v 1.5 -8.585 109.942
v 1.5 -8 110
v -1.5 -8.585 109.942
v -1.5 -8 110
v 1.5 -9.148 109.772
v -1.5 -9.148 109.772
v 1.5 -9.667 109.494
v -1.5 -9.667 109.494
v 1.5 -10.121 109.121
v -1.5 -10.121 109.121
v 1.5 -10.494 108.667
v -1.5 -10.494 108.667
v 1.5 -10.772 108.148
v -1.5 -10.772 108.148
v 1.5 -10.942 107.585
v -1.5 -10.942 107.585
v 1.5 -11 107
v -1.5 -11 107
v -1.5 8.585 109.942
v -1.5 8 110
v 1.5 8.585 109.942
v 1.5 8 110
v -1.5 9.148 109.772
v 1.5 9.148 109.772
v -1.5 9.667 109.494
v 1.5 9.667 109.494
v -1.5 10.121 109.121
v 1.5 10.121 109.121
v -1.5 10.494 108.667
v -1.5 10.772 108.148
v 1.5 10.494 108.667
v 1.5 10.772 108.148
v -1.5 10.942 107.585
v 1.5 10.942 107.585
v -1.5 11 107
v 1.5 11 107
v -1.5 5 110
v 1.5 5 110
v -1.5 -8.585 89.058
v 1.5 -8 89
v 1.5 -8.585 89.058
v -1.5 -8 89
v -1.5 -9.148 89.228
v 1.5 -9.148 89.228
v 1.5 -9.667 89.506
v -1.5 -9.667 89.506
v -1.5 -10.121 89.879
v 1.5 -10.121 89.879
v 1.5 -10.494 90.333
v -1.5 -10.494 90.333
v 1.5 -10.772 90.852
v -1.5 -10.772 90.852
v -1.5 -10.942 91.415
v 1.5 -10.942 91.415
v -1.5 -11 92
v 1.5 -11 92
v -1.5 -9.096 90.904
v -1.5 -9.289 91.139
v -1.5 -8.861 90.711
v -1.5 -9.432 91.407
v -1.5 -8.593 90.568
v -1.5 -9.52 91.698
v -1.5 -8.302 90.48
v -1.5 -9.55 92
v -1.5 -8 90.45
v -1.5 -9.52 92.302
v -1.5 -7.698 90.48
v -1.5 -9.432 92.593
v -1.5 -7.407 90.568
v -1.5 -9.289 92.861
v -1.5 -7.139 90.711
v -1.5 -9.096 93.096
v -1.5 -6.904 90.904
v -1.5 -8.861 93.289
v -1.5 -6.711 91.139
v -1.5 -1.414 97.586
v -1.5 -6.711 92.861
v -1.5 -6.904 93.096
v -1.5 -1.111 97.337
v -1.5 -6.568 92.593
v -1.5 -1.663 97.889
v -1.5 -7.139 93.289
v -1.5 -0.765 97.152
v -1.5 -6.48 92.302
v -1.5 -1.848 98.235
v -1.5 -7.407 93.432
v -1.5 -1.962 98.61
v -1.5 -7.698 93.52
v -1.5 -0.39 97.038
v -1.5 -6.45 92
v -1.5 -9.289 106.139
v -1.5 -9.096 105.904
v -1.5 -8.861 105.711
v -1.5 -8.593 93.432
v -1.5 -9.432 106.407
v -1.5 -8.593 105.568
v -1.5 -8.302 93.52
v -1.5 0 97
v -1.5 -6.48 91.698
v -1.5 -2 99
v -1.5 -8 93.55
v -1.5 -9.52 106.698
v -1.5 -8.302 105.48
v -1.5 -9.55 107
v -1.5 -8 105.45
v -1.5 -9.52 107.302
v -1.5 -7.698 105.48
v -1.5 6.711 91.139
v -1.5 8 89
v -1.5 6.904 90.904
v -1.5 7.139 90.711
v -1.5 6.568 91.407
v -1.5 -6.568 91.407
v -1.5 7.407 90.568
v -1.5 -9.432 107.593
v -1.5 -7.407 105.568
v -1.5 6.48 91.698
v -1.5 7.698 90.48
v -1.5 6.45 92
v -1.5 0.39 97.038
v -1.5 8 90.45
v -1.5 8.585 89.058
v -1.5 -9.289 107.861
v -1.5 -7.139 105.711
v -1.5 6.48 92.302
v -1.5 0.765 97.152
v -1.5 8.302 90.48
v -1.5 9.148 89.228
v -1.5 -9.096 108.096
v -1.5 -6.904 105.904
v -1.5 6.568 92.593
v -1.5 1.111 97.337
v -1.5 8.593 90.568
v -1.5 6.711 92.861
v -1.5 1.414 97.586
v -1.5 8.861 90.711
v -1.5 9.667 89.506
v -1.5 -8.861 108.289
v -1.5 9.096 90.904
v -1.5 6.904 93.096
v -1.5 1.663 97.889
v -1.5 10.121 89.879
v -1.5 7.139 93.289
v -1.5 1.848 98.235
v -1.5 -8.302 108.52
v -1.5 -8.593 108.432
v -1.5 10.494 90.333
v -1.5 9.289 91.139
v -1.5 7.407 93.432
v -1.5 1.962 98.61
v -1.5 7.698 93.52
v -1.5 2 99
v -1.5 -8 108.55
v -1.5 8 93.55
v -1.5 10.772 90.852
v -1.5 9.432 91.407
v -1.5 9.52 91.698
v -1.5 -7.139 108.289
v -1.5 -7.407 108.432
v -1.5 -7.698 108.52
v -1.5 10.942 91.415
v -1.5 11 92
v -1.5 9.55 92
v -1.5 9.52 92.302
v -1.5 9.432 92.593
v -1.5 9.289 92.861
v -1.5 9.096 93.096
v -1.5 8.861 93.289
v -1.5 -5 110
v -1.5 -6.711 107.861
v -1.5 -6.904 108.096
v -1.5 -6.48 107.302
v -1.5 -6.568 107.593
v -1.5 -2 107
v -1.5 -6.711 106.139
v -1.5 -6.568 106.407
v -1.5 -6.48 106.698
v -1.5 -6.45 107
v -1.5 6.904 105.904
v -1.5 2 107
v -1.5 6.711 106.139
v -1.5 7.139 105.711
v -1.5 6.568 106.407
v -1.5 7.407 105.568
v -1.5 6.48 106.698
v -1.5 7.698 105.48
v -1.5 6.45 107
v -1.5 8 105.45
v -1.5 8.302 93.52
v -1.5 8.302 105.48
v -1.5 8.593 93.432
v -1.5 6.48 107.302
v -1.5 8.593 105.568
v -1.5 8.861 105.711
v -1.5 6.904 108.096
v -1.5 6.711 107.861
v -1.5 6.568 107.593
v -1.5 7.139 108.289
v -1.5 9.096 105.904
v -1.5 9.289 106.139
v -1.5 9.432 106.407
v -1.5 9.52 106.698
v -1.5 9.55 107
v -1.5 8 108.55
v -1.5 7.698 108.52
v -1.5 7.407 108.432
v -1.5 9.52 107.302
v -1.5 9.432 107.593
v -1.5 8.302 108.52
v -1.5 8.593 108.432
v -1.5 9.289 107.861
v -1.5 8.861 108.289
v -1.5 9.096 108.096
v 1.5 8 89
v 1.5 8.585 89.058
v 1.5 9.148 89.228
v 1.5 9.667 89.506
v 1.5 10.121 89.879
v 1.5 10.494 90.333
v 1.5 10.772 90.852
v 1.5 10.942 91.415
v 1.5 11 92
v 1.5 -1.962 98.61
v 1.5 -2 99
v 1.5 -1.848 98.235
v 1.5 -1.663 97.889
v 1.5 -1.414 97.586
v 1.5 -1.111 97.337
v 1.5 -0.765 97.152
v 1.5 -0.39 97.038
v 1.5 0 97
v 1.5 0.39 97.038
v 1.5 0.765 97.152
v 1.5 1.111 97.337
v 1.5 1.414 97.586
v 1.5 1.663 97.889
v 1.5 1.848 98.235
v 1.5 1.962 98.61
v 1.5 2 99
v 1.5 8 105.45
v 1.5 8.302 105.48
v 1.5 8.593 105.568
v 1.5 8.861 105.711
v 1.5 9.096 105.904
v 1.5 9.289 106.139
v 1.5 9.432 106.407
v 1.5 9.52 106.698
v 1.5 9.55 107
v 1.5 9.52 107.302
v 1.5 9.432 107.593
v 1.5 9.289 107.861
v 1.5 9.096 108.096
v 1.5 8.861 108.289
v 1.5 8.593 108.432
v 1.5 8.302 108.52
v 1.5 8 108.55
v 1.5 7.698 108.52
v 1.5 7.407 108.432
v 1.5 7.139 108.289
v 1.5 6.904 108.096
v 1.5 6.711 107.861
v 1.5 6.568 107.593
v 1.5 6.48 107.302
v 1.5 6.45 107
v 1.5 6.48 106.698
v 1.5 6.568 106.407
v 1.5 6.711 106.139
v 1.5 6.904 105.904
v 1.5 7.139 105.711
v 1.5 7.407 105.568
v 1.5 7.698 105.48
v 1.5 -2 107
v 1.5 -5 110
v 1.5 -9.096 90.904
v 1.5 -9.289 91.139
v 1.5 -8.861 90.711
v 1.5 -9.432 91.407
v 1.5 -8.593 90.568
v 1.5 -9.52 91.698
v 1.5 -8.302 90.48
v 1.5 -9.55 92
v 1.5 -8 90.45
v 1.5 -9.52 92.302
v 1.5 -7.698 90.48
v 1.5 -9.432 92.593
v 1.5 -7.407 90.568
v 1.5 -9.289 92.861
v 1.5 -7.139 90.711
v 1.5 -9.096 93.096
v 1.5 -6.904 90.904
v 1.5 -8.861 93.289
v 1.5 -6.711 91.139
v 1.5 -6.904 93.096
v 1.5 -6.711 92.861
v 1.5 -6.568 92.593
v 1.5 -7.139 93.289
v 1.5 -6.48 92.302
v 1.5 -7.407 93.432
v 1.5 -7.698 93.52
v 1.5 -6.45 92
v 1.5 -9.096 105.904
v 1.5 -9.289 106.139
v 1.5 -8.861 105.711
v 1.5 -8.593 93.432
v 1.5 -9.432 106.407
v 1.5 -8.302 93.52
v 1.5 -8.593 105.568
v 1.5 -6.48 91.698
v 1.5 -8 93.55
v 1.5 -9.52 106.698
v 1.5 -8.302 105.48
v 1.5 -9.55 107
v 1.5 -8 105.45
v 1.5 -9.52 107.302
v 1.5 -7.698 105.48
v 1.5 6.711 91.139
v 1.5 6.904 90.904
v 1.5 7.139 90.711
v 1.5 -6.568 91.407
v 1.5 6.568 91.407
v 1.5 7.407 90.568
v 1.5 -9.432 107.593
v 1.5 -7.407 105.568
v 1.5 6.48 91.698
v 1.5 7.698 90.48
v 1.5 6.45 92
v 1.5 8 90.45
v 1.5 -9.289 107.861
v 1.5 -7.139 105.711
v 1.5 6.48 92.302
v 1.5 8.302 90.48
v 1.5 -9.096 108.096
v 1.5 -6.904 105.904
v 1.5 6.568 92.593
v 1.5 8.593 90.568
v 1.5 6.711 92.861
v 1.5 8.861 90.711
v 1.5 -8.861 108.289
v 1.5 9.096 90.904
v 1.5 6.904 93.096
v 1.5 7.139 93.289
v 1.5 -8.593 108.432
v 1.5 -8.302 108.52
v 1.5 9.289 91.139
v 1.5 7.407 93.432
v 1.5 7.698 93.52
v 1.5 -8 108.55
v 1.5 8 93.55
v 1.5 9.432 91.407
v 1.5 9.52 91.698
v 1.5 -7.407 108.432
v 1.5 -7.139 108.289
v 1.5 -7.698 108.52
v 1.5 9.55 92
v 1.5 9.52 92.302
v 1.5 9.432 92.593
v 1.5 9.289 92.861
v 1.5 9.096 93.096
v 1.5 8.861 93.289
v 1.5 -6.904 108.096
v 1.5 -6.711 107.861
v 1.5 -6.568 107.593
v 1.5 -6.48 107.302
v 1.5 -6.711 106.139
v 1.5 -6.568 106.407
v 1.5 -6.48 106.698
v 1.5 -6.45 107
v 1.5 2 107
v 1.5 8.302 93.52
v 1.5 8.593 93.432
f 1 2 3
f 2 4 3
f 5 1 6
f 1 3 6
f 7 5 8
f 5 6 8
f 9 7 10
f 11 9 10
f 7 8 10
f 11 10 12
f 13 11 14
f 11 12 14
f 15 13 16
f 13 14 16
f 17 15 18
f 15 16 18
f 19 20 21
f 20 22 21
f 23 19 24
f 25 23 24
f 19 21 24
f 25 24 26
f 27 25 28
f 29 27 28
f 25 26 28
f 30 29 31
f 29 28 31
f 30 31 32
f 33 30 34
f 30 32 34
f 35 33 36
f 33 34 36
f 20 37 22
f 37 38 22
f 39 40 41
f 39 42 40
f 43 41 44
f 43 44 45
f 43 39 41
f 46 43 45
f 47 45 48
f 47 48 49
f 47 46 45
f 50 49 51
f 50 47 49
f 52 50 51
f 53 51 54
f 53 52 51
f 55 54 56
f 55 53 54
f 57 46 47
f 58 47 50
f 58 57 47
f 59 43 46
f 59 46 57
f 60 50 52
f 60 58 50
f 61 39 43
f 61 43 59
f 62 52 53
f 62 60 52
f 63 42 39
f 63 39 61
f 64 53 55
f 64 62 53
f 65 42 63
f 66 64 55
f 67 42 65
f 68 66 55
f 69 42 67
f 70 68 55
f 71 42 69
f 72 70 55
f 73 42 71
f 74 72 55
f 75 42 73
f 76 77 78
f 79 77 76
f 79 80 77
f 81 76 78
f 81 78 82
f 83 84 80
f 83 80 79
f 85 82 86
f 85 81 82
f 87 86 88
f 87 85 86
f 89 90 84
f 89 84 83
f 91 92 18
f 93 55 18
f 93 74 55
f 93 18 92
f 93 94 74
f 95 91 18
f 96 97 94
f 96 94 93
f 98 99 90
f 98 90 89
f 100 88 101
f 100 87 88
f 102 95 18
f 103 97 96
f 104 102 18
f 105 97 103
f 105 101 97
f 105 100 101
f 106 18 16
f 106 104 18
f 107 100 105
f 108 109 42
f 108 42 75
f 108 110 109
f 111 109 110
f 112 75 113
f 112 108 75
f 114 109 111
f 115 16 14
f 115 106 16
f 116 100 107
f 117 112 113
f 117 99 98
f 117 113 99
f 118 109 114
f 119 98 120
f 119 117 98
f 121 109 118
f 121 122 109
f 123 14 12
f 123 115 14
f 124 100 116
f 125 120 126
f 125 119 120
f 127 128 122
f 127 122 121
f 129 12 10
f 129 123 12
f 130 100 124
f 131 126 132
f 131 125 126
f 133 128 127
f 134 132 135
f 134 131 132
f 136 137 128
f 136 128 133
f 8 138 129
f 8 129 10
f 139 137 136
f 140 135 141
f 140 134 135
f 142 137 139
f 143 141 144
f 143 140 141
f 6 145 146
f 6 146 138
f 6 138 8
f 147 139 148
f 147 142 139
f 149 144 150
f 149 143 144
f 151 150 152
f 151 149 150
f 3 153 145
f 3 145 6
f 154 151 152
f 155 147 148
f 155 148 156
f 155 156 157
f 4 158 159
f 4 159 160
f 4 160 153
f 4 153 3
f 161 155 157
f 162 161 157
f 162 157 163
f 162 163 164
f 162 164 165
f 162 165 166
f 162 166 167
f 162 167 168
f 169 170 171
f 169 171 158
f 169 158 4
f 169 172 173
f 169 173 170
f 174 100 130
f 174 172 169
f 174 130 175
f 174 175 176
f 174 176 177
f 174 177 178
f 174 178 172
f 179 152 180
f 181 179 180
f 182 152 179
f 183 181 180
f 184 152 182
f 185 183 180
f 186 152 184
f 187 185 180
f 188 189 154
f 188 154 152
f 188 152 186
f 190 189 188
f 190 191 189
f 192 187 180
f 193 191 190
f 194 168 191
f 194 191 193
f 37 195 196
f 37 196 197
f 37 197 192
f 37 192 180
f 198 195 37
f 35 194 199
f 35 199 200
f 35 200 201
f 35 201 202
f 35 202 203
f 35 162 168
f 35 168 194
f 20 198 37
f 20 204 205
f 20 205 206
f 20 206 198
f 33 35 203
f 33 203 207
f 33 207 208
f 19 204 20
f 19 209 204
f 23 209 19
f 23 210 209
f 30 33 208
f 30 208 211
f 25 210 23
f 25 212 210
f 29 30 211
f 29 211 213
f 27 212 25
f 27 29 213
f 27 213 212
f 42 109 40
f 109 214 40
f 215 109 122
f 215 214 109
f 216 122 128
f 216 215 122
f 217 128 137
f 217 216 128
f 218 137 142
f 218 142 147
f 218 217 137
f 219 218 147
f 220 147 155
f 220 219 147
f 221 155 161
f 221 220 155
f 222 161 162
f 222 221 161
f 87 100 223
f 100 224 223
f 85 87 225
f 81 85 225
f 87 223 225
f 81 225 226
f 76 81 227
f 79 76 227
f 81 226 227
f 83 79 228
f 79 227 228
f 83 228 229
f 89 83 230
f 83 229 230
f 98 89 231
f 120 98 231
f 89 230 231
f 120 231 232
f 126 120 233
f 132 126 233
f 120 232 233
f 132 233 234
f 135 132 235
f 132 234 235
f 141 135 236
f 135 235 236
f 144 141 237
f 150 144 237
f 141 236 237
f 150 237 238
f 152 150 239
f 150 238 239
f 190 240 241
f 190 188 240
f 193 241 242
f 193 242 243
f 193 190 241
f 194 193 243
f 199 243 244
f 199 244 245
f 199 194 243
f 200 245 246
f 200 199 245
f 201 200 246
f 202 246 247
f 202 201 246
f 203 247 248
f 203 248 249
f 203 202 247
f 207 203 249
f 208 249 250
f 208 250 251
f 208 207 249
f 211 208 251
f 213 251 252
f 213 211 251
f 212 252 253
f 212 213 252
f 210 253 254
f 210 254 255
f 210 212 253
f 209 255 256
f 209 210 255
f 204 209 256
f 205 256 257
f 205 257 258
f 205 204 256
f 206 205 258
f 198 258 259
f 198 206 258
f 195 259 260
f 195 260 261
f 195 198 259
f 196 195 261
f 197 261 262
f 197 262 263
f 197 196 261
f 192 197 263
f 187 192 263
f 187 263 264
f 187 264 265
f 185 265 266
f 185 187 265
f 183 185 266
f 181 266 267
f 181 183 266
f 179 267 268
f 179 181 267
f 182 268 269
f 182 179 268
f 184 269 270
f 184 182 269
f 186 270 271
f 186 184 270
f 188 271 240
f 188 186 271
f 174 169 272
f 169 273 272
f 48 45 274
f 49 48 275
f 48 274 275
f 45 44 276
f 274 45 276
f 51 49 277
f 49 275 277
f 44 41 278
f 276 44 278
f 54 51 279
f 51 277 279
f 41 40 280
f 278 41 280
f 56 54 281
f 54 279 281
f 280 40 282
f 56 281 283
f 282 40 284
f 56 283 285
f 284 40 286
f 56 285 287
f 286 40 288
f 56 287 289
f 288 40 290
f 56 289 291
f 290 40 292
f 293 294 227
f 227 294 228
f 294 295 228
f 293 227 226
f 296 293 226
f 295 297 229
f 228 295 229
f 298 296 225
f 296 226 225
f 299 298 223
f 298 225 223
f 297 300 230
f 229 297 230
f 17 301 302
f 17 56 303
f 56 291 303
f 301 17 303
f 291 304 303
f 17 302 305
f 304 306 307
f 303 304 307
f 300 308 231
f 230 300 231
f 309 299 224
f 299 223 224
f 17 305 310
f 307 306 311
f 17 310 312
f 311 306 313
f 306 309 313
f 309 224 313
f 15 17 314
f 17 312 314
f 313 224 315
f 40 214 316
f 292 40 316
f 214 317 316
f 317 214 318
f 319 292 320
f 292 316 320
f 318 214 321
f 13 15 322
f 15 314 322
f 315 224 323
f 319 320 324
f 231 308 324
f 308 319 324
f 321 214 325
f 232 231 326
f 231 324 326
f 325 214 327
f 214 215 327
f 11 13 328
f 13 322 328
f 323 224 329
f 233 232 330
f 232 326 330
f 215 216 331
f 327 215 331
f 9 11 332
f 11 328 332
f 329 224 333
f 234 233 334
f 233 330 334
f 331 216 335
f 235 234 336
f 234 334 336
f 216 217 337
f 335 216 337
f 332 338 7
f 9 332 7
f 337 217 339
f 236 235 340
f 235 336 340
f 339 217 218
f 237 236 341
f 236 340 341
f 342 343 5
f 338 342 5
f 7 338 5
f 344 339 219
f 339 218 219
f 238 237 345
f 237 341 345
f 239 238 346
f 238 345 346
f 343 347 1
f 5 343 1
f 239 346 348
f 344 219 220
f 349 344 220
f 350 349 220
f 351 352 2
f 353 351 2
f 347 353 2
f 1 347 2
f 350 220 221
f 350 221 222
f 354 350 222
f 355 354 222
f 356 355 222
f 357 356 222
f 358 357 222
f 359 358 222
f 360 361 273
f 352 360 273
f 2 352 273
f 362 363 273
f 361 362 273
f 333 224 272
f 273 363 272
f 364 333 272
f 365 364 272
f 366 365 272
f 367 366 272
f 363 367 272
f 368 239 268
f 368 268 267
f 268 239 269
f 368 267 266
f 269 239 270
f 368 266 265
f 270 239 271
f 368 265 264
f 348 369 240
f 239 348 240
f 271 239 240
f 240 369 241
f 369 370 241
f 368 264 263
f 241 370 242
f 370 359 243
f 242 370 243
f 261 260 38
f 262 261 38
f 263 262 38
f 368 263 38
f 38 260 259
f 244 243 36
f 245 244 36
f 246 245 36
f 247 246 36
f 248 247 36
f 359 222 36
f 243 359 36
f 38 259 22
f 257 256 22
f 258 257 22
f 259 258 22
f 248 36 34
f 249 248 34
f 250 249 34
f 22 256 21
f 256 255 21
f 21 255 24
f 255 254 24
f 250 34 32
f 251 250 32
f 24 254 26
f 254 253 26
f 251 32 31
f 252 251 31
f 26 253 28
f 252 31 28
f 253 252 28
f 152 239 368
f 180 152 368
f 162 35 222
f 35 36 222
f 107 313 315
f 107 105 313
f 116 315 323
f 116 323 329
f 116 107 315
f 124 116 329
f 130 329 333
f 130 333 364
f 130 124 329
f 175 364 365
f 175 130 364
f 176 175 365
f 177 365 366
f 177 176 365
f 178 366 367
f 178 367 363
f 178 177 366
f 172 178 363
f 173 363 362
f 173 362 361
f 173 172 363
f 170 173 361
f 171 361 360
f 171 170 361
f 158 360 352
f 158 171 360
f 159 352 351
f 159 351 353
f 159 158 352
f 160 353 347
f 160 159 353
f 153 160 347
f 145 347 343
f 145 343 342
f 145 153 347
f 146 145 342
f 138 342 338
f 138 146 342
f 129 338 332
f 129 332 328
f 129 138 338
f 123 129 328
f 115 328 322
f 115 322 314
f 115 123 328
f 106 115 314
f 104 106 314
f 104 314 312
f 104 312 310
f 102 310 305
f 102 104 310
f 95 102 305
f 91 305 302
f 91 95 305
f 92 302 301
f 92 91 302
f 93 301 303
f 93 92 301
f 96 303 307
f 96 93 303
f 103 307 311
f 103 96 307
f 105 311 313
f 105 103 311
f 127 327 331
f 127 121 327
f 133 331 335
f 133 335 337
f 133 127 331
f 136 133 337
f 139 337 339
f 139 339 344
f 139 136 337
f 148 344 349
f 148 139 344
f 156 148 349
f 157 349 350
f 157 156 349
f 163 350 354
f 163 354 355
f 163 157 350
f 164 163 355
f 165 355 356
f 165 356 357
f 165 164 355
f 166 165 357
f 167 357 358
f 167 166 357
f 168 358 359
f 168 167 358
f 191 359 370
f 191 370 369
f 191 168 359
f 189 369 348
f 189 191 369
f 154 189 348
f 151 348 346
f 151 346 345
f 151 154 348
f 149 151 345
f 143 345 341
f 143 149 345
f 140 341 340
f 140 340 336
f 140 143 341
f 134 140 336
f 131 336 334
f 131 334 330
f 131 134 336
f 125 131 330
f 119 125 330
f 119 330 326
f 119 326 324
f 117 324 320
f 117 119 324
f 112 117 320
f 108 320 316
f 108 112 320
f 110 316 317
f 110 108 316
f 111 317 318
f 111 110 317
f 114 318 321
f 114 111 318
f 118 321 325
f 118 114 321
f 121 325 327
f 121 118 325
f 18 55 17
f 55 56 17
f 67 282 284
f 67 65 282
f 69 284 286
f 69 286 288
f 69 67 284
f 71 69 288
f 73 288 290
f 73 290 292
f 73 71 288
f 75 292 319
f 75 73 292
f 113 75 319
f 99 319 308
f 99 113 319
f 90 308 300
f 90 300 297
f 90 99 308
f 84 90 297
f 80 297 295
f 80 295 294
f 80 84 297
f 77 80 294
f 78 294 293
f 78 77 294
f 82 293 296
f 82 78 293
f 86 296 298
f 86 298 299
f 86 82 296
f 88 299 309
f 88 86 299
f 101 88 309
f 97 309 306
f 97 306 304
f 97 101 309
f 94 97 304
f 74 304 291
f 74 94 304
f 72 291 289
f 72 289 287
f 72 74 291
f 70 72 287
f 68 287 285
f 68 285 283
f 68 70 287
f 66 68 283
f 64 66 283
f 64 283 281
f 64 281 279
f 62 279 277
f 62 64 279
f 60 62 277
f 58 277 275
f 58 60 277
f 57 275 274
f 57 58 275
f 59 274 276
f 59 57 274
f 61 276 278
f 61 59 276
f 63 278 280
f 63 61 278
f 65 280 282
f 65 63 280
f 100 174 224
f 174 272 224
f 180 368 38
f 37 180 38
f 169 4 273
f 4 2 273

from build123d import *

# Parameters (mm, degrees)
SKETCH_1_R      = 1.55
EXTRUDE_1_DEPTH = 1.5
FILLET_1_R      = 3


with BuildPart() as part:
    # 草图1 → 凸台-拉伸1 (new body, symmetric)
    with BuildSketch(Plane(origin=(0, 0, 0), x_dir=(0, 0, -1), z_dir=(1, 0, 0))):
        with BuildLine():
            Line((-89, 11), (-89, -11))
            Line((-89, -11), (-110, -11))
            Line((-110, -11), (-110, -5))
            Line((-110, -5), (-107, -2))
            Line((-107, -2), (-99, -2))
            ThreePointArc((-99, -2), (-97, 0), (-99, 2))
            Line((-99, 2), (-107, 2))
            Line((-107, 2), (-110, 5))
            Line((-110, 5), (-110, 11))
            Line((-110, 11), (-89, 11))
        make_face()
        with Locations((-107, 8)):
            Circle(SKETCH_1_R, mode=Mode.SUBTRACT)
        with Locations((-92, 8)):
            Circle(SKETCH_1_R, mode=Mode.SUBTRACT)
        with Locations((-92, -8)):
            Circle(SKETCH_1_R, mode=Mode.SUBTRACT)
        with Locations((-107, -8)):
            Circle(SKETCH_1_R, mode=Mode.SUBTRACT)
    extrude(amount=EXTRUDE_1_DEPTH, both=True)

    # 圆角1
    fillet_1_edges = [part.edges().sort_by_distance(p)[0] for p in [
        (0, 11, 110),
        (0, 11, 89),
        (0, -11, 89),
        (0, -11, 110),
    ]]
    fillet(fillet_1_edges, radius=FILLET_1_R)


solid = part.part
